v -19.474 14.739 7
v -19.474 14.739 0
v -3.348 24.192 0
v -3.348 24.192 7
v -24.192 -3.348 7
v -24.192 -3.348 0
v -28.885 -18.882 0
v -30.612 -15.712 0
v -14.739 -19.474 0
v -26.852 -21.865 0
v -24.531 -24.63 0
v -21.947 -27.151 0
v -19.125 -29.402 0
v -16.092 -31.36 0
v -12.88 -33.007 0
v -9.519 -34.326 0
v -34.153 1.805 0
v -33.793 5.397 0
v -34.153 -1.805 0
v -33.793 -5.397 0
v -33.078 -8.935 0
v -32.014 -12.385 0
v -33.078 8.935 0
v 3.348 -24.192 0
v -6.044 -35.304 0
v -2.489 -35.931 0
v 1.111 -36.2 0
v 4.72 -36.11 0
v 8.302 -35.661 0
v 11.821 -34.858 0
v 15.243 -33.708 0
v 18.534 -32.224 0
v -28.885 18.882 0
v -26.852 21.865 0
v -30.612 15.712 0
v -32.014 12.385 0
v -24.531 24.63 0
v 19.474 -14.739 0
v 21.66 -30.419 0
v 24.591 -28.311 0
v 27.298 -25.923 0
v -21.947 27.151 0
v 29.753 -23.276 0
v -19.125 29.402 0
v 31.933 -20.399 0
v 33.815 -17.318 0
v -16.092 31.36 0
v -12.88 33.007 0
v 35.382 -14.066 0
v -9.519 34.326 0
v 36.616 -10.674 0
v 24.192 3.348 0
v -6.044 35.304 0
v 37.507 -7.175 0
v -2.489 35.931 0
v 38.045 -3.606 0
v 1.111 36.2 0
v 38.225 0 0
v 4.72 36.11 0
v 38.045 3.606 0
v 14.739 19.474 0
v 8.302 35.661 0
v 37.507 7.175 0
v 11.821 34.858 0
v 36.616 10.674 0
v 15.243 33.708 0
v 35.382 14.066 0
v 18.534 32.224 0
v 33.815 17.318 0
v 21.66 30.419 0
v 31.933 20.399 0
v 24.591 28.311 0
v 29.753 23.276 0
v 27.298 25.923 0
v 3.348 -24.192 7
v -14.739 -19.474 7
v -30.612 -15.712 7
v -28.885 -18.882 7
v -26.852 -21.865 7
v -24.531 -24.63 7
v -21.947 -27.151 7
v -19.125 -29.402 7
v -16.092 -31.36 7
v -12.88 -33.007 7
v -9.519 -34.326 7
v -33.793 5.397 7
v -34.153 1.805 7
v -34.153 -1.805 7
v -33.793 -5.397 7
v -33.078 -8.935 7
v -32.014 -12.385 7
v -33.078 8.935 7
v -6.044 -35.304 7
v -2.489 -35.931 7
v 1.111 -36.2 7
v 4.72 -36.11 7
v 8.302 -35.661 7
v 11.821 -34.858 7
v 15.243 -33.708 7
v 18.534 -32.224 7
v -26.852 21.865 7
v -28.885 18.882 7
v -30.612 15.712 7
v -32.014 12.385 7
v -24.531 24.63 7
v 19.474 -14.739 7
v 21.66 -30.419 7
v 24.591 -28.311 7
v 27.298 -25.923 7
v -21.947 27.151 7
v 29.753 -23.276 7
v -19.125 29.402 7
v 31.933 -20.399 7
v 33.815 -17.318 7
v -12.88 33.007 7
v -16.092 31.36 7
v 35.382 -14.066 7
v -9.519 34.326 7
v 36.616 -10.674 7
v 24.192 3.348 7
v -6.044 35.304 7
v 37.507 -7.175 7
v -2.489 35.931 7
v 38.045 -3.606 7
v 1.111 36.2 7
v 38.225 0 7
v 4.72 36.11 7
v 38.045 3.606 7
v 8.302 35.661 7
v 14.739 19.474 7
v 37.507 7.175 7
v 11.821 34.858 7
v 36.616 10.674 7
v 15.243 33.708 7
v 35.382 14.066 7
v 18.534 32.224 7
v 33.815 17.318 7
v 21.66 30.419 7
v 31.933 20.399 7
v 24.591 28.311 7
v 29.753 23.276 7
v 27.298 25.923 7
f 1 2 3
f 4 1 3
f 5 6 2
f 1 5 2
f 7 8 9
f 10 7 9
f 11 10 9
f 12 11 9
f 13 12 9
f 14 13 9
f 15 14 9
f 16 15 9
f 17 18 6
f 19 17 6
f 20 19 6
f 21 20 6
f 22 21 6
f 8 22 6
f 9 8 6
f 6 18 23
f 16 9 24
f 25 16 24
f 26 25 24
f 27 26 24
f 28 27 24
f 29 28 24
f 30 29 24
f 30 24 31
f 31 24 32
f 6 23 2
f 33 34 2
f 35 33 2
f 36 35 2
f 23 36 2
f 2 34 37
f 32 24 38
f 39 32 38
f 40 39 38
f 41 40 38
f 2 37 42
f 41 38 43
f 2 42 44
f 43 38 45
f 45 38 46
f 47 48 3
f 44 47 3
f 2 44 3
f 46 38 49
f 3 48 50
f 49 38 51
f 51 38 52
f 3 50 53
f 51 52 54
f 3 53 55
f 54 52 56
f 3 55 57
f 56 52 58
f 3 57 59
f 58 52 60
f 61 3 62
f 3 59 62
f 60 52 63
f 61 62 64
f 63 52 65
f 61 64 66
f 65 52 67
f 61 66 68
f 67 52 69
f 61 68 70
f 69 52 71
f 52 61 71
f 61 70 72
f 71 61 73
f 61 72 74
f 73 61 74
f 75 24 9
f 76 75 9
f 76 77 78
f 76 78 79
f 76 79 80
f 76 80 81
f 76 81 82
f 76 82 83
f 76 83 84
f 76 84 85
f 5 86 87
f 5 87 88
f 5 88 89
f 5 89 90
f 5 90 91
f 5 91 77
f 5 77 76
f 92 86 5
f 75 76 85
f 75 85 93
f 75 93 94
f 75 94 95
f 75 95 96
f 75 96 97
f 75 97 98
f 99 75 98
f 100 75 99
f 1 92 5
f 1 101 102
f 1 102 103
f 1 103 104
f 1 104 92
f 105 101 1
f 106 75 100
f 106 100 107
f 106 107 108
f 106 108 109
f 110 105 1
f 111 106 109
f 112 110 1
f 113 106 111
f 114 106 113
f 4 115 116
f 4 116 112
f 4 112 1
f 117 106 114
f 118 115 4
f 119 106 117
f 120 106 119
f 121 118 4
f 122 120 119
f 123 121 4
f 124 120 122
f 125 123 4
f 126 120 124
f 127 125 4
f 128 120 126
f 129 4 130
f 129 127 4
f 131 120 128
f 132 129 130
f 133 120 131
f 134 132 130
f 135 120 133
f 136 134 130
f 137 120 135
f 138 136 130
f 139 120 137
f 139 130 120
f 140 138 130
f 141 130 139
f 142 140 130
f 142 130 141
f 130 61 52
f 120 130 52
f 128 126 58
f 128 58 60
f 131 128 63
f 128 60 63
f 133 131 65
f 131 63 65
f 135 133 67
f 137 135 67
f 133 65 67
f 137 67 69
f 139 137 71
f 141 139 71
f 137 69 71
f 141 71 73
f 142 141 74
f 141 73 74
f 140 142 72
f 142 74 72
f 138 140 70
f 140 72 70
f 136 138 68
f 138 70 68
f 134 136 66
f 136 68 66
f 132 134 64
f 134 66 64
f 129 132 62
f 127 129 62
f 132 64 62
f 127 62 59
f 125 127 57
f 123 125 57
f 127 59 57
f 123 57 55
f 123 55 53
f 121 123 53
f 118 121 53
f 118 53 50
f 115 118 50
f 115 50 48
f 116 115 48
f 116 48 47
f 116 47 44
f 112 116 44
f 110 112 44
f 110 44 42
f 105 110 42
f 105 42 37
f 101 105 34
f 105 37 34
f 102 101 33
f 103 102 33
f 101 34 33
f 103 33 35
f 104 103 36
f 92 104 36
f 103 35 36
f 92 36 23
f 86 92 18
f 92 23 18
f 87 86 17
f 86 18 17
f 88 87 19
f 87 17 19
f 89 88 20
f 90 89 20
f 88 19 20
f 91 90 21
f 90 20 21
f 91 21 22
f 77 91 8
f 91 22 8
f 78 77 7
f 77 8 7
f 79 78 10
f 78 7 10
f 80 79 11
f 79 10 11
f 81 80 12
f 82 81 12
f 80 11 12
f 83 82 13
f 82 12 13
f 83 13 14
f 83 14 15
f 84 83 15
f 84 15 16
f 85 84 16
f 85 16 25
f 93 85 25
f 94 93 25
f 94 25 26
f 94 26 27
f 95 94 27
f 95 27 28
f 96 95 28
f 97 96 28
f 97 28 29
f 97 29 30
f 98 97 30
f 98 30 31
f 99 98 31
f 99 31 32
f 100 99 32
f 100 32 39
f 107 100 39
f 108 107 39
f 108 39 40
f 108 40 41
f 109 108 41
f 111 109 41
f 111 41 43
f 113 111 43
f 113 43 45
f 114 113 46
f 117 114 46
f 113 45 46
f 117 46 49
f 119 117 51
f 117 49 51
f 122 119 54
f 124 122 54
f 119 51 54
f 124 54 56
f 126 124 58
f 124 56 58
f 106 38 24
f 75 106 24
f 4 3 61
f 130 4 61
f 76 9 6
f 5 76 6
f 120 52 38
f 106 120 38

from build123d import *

# Parameters (mm, degrees)
F0_R     = 36.211569
F1_DEPTH = 7


with BuildPart() as f1:
    # F0 (on Top) → F1 (new body)
    with BuildSketch(Plane.XY):
        with Locations((2.013676, 0)):
            Circle(F0_R)
        Polygon((3.347939, -24.192038), (-14.739004, -19.473705), (-24.192038, -3.347939), (-19.473705, 14.739004), (-3.347939, 24.192038), (14.739004, 19.473705), (24.192038, 3.347939), (19.473705, -14.739004), align=None, mode=Mode.SUBTRACT)
    extrude(amount=F1_DEPTH)


solid = f1.part
